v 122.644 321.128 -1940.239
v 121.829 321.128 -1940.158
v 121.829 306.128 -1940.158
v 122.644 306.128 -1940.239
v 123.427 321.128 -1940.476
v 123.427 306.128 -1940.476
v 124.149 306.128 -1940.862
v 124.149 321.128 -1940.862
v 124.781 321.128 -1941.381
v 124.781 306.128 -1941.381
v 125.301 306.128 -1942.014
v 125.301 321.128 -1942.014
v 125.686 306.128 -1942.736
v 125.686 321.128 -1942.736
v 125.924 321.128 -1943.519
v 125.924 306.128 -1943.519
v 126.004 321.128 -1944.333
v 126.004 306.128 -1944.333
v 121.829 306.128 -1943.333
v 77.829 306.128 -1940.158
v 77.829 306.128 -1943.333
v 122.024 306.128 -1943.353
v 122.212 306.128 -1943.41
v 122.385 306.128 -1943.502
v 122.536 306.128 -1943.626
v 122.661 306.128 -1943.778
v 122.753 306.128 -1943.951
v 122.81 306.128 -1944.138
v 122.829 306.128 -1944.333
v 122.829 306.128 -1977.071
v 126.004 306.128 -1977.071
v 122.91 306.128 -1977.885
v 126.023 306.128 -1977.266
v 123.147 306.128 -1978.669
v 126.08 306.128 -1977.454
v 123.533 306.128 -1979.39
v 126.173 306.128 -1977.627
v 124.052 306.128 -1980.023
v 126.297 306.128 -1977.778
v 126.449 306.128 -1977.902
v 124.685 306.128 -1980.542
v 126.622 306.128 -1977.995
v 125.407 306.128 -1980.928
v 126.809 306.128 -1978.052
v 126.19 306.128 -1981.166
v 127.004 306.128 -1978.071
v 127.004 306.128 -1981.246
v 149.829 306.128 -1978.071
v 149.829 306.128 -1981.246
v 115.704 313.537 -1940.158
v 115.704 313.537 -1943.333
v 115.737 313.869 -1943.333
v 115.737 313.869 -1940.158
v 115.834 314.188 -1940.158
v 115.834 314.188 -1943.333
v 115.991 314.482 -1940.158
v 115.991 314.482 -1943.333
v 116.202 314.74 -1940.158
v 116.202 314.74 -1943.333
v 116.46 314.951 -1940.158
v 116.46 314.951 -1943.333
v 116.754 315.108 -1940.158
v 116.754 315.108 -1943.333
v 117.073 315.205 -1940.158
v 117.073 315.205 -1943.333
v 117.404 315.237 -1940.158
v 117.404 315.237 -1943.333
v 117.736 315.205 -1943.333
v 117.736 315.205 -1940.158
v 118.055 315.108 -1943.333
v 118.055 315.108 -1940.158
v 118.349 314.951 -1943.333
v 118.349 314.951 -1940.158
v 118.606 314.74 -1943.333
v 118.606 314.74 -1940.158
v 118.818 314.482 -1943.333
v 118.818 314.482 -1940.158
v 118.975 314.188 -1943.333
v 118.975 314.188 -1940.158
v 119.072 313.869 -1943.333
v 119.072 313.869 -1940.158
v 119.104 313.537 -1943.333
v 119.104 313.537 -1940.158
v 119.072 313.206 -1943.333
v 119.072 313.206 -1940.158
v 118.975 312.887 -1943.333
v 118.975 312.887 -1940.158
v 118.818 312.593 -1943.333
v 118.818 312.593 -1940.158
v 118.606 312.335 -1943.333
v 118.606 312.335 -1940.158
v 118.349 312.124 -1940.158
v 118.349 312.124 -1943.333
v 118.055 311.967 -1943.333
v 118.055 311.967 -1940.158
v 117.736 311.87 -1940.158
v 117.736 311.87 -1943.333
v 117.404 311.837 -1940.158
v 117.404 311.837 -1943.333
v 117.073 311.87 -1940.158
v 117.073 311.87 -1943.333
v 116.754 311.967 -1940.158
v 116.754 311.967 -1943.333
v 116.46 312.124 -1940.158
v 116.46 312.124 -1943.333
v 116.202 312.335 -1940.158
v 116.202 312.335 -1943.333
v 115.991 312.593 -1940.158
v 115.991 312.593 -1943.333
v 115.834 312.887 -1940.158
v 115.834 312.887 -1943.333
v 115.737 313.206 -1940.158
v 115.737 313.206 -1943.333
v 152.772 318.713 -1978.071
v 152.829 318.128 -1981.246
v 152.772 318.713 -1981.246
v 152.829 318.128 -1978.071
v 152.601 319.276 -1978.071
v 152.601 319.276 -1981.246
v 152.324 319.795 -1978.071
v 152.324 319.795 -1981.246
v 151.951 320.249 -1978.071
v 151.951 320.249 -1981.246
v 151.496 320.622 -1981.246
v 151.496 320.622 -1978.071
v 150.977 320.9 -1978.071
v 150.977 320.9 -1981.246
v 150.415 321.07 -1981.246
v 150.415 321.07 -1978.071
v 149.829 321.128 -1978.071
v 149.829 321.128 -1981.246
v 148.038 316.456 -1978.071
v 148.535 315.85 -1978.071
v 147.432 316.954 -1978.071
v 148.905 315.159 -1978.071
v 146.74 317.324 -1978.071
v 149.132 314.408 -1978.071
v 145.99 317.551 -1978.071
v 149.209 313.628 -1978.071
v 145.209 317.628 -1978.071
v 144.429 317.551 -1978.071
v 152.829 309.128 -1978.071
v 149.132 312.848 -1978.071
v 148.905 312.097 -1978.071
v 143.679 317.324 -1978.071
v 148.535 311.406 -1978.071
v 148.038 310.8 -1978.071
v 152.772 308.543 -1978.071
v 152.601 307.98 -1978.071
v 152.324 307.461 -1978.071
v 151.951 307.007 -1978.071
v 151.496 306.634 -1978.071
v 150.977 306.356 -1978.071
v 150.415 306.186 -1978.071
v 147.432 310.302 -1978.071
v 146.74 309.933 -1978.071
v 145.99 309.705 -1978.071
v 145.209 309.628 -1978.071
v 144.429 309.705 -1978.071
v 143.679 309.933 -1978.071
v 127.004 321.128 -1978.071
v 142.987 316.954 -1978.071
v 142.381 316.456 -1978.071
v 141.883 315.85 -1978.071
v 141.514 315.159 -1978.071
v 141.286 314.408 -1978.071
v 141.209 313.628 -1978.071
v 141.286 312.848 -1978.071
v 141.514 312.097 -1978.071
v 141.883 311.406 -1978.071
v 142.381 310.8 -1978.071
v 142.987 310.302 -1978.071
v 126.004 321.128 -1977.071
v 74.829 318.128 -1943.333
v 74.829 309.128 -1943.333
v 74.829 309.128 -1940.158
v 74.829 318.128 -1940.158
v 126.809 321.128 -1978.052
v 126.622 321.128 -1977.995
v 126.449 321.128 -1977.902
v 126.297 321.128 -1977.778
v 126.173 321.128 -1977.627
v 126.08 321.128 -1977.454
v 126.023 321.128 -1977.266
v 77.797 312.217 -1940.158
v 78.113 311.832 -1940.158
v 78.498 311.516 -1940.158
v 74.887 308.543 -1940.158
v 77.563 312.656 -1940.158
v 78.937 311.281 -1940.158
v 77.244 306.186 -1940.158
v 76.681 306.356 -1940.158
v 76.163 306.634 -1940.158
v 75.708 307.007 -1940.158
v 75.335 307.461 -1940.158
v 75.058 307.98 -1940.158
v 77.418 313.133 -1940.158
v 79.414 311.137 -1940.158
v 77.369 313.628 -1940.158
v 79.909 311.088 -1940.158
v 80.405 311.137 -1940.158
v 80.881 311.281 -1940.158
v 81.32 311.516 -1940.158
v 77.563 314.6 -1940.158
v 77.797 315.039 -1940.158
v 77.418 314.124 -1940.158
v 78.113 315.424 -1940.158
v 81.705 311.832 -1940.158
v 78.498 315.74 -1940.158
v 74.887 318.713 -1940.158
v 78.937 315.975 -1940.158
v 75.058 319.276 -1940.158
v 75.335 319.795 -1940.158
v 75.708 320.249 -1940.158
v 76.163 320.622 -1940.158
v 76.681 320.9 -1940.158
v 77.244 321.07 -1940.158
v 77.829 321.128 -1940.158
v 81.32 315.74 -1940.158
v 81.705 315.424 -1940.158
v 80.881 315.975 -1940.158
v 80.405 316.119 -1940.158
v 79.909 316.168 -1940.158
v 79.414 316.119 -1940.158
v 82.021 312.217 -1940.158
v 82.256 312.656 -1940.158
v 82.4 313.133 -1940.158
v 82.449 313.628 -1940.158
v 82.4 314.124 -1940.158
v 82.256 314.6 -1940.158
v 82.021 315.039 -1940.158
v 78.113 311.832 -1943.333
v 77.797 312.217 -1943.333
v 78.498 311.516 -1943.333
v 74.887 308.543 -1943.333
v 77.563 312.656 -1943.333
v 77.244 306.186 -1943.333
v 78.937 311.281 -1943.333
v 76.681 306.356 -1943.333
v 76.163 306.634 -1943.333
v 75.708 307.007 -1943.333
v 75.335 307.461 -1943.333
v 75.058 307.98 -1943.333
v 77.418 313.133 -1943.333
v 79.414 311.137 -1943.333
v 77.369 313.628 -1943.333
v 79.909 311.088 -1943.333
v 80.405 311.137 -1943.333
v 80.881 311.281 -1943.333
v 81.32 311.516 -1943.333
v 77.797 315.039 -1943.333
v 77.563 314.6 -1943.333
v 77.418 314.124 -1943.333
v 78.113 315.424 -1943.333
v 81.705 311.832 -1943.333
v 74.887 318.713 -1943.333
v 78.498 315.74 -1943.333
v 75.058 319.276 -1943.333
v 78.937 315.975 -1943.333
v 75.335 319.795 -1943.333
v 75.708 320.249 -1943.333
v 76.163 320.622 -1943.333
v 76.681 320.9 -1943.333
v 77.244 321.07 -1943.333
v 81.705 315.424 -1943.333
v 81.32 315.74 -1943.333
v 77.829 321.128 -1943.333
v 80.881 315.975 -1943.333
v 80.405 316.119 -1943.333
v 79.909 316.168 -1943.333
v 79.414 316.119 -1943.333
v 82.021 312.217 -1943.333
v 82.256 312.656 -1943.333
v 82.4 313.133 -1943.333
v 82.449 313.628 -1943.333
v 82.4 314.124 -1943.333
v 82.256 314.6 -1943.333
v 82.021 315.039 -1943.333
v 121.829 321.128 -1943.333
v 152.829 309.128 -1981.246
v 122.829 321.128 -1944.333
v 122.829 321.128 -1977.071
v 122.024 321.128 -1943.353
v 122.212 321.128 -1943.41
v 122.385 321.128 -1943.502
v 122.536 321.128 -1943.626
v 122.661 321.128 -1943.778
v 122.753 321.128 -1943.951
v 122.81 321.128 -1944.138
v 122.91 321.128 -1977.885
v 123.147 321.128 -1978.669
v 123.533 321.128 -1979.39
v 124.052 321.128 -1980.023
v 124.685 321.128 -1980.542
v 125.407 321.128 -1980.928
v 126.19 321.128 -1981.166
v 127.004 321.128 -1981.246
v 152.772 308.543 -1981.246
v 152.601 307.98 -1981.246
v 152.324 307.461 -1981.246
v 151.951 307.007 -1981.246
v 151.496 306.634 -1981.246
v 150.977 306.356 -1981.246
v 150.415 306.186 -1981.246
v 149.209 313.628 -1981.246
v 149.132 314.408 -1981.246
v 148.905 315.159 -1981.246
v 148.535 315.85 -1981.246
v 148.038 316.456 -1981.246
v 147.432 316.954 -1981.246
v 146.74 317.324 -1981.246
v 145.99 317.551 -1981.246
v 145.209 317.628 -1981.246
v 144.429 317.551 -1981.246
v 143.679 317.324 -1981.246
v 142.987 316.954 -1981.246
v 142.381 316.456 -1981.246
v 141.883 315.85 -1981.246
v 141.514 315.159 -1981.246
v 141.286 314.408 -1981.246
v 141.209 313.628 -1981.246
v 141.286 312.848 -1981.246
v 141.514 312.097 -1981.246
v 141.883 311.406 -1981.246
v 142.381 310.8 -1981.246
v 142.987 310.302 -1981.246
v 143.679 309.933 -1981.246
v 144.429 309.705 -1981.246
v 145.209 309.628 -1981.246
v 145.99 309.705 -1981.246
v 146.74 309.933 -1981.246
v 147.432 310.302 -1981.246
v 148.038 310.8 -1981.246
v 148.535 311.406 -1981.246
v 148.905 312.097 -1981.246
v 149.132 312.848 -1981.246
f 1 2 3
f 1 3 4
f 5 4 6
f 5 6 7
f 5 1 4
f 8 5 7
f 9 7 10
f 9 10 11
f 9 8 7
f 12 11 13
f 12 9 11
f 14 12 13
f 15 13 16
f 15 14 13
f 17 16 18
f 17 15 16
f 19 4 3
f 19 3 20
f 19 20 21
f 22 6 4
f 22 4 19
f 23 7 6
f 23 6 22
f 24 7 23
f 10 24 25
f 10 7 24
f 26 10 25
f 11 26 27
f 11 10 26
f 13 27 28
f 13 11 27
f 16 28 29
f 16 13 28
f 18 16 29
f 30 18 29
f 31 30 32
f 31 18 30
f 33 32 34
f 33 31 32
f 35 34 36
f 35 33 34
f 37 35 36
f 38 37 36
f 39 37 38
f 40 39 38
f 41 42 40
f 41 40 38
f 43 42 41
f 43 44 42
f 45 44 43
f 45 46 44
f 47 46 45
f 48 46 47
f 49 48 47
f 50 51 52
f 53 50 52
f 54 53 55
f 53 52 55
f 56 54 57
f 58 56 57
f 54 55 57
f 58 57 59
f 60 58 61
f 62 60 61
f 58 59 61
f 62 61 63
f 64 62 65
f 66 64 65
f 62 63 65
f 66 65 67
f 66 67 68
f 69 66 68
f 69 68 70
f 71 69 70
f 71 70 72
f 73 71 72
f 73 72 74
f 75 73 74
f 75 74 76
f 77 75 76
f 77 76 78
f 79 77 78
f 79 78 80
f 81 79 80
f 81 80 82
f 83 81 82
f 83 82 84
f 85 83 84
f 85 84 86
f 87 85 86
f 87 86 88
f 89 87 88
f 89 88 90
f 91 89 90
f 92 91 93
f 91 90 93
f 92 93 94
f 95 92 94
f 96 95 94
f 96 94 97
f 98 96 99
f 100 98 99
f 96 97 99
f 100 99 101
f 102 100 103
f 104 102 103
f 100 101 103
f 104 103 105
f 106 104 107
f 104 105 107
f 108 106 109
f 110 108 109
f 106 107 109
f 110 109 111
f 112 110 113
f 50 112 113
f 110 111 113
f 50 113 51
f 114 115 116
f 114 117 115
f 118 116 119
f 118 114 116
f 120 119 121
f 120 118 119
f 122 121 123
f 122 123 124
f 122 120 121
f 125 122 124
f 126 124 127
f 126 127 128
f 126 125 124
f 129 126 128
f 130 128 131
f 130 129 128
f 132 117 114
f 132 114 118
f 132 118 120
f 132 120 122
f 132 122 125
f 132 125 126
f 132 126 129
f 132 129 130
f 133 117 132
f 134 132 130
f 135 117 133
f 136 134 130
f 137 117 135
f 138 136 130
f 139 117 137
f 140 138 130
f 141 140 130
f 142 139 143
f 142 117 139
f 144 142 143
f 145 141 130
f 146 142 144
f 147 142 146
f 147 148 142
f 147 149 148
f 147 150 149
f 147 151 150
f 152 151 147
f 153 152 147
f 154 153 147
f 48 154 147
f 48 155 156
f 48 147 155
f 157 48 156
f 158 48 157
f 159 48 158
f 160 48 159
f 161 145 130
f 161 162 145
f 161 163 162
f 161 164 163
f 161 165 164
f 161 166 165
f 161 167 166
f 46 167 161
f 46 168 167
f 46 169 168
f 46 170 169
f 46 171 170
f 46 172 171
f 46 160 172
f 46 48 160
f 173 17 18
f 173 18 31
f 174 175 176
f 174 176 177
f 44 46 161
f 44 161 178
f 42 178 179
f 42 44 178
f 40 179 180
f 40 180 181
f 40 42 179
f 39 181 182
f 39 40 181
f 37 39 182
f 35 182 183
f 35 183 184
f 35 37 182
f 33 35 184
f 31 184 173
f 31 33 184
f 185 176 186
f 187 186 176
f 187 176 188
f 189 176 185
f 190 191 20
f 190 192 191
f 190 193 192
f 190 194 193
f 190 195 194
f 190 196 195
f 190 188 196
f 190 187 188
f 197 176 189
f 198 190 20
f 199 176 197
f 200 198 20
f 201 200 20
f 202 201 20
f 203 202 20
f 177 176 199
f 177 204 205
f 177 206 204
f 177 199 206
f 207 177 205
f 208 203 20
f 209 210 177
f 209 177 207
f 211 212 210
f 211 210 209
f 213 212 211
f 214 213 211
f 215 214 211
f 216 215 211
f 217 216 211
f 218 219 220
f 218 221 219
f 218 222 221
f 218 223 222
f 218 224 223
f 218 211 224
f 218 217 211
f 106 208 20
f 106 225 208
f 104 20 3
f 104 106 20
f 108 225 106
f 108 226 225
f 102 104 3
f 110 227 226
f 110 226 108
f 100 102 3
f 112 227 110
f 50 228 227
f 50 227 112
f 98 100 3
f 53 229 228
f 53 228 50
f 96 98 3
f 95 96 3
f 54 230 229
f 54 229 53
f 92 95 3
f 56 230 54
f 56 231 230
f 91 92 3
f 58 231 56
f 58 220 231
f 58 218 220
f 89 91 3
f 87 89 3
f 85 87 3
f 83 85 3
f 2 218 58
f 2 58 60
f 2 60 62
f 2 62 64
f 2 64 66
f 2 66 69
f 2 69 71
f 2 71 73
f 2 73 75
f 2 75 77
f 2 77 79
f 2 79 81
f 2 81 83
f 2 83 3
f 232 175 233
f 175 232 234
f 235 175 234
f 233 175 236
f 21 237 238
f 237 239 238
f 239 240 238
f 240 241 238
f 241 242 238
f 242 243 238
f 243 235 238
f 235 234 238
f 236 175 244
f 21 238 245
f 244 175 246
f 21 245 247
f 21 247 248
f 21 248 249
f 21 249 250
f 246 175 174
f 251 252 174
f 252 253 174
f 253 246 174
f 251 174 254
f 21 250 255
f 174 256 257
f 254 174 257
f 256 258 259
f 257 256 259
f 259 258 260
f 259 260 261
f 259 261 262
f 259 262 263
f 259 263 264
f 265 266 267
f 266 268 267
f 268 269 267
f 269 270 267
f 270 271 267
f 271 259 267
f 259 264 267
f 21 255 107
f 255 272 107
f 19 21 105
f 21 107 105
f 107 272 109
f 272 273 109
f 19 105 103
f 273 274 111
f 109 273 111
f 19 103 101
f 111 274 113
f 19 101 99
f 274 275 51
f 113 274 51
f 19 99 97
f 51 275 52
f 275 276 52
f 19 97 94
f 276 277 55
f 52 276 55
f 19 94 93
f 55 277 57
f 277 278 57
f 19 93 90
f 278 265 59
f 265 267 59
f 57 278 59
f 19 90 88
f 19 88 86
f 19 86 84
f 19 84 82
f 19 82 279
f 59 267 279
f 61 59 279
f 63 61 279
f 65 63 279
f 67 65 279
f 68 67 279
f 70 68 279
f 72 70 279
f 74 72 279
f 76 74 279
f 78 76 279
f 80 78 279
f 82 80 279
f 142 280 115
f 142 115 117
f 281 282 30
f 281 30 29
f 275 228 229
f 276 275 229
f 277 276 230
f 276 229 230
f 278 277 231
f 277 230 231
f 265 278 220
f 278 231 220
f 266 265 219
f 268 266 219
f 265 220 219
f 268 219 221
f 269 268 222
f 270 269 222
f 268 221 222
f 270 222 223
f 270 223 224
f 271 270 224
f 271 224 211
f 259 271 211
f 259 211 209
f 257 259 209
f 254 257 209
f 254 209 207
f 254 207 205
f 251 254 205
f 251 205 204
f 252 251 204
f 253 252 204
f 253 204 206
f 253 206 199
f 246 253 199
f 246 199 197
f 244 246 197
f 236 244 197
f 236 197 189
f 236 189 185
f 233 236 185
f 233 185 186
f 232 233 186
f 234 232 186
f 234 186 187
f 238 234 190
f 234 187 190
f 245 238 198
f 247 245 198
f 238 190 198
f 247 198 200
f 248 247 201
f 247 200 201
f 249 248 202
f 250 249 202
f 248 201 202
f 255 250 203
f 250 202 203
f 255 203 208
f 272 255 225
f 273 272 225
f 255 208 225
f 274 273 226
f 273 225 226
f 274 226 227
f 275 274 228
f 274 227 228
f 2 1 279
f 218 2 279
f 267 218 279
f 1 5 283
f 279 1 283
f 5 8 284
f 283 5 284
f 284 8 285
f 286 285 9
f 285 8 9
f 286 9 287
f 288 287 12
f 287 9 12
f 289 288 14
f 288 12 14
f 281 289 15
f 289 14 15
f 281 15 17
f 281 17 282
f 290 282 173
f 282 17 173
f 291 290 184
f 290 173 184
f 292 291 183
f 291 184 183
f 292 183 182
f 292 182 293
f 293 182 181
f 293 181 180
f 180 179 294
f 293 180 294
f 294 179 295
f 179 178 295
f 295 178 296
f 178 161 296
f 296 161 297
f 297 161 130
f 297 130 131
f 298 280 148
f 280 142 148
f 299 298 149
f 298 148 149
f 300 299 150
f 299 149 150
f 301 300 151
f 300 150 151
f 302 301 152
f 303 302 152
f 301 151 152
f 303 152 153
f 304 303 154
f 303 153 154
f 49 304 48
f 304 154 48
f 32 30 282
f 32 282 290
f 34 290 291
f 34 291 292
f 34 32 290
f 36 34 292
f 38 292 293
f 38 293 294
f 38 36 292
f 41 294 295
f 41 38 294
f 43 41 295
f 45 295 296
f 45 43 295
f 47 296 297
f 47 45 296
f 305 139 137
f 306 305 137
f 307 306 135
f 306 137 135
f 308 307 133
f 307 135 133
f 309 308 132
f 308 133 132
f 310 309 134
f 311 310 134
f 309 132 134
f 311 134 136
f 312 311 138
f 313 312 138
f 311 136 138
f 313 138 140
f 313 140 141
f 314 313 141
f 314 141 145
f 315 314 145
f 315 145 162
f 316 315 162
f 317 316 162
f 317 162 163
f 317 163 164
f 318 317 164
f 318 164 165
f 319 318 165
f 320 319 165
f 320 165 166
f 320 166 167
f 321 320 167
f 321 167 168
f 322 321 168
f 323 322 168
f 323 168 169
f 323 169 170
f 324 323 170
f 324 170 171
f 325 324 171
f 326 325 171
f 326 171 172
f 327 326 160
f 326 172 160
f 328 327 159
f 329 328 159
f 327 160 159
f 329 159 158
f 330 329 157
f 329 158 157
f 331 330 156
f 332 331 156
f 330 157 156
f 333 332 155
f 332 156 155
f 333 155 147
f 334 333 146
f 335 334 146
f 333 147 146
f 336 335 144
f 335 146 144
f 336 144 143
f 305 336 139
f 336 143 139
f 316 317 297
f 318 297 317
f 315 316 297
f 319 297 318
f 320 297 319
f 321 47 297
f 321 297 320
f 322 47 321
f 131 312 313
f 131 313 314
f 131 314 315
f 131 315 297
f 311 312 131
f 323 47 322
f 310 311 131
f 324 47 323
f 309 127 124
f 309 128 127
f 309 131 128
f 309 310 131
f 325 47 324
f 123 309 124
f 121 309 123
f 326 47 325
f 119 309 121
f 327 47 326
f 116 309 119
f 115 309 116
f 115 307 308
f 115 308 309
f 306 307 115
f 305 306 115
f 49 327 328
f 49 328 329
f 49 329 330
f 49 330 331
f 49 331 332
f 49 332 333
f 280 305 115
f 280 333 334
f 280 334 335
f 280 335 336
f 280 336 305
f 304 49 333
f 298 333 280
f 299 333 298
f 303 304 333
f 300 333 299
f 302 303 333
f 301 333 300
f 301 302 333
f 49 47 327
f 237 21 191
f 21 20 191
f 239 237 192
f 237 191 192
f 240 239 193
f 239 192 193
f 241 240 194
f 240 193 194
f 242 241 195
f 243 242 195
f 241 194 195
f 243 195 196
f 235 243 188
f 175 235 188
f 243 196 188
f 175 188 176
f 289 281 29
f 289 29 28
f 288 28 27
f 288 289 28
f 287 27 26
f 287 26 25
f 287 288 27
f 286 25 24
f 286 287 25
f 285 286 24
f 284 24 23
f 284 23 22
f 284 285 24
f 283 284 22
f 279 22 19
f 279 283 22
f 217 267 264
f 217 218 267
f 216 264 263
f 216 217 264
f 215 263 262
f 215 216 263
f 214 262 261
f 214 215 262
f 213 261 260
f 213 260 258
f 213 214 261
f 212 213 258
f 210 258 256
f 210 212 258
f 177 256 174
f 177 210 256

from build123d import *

# Parameters (mm, degrees)
SKETCH1_W                    = 48
SKETCH1_H                    = 15
BASE_FLANGE1_DEPTH           = 3.175
EDGE_FLANGE1_STRIP_W         = 14.7
EDGE_FLANGE1_STRIP_H         = 3.175
EDGE_FLANGE1_STRIP_CUT_DEPTH = 15
EDGE_FLANGE1_DEPTH           = 15
EDGE_FLANGE2_STRIP_W         = 14.7
EDGE_FLANGE2_STRIP_H         = 3.175
EDGE_FLANGE2_STRIP_CUT_DEPTH = 15
EDGE_FLANGE2_DEPTH           = 15
FILLET1_R                    = 3
SKETCH18_R                   = 2.54
CUT_EXTRUDE2_DEPTH           = 359.005866467
SKETCH19_R                   = 4
CUT_EXTRUDE3_DEPTH           = 358.655386406
M3_CLEARANCE_HOLE1_D         = 3.4


# Sheet-metal steps are written as plain solids
with BuildPart() as part:
    # Sketch1 → Base-Flange1 (new body)
    with BuildSketch(Plane.XY.offset(-1943.333434301)):
        with Locations((98.829284585, 313.628054742)):
            Rectangle(SKETCH1_W, SKETCH1_H)
    extrude(amount=BASE_FLANGE1_DEPTH)

    # Edge-Flange1 strip (across the edge) → Edge-Flange1 strip cut (cut)
    with BuildSketch(Plane(origin=(122.829284585, 321.128054742, -1943.333434301), x_dir=(-1, 0, 0), z_dir=(0, -1, 0))):
        with Locations((-6.35, -1.5875)):
            Rectangle(EDGE_FLANGE1_STRIP_W, EDGE_FLANGE1_STRIP_H)
    extrude(amount=EDGE_FLANGE1_STRIP_CUT_DEPTH, mode=Mode.SUBTRACT)

    # Edge-Flange1 section (across the edge) → Edge-Flange1 (add)
    with BuildSketch(Plane(origin=(122.829284585, 321.128054742, -1943.333434301), x_dir=(-1, 0, 0), z_dir=(0, -1, 0))):
        with BuildLine():
            Line((-3.175, 1), (-3.175, 34.7375))
            Line((-3.175, 34.7375), (0, 34.7375))
            Line((0, 34.7375), (0, 1))
            ThreePointArc((0, 1), (0.292893219, 0.292893219), (1, 0))
            Line((1, 0), (1, -3.175))
            ThreePointArc((1, -3.175), (-1.952170811, -1.952170811), (-3.175, 1))
        make_face()
    extrude(amount=EDGE_FLANGE1_DEPTH)

    # Edge-Flange2 strip (across the edge) → Edge-Flange2 strip cut (cut)
    with BuildSketch(Plane(origin=(126.004284585, 306.128054742, -1978.070934301), x_dir=(0, 0, 1), z_dir=(0, 1, 0))):
        with Locations((-6.35, -1.5875)):
            Rectangle(EDGE_FLANGE2_STRIP_W, EDGE_FLANGE2_STRIP_H)
    extrude(amount=EDGE_FLANGE2_STRIP_CUT_DEPTH, mode=Mode.SUBTRACT)

    # Edge-Flange2 section (across the edge) → Edge-Flange2 (add)
    with BuildSketch(Plane(origin=(126.004284585, 306.128054742, -1978.070934301), x_dir=(0, 0, 1), z_dir=(0, 1, 0))):
        with BuildLine():
            Line((-3.175, 1), (-3.175, 26.825))
            Line((-3.175, 26.825), (0, 26.825))
            Line((0, 26.825), (0, 1))
            ThreePointArc((0, 1), (0.292893219, 0.292893219), (1, 0))
            Line((1, 0), (1, -3.175))
            ThreePointArc((1, -3.175), (-1.952170811, -1.952170811), (-3.175, 1))
        make_face()
    extrude(amount=EDGE_FLANGE2_DEPTH)

    # Fillet1
    fillet1_edges = [part.edges().sort_by_distance(p)[0] for p in [
        (152.829284585, 306.128054742, -1979.658434301),
        (152.829284585, 321.128054742, -1979.658434301),
        (74.829284585, 306.128054742, -1941.745934301),
        (74.829284585, 321.128054742, -1941.745934301),
    ]]
    fillet(fillet1_edges, radius=FILLET1_R)

    # Sketch18 → Cut-Extrude2 (cut, through all)
    with BuildSketch(Plane.XY.offset(-1940.158434301)):
        with Locations((79.909284585, 313.628054742)):
            Circle(SKETCH18_R)
    extrude(amount=-CUT_EXTRUDE2_DEPTH, mode=Mode.SUBTRACT)

    # Sketch19 → Cut-Extrude3 (cut, through all)
    with BuildSketch(Plane.XY.offset(-1978.070934301)):
        with Locations((145.209284585, 313.628054742)):
            Circle(SKETCH19_R)
    extrude(amount=-CUT_EXTRUDE3_DEPTH, mode=Mode.SUBTRACT)

    # M3 Clearance Hole1 (through all)
    with Locations(Plane.XY.offset(-1940.158434301)):
        with Locations((117.404284585, 313.537425755)):
            Hole(M3_CLEARANCE_HOLE1_D / 2)


solid = part.part
